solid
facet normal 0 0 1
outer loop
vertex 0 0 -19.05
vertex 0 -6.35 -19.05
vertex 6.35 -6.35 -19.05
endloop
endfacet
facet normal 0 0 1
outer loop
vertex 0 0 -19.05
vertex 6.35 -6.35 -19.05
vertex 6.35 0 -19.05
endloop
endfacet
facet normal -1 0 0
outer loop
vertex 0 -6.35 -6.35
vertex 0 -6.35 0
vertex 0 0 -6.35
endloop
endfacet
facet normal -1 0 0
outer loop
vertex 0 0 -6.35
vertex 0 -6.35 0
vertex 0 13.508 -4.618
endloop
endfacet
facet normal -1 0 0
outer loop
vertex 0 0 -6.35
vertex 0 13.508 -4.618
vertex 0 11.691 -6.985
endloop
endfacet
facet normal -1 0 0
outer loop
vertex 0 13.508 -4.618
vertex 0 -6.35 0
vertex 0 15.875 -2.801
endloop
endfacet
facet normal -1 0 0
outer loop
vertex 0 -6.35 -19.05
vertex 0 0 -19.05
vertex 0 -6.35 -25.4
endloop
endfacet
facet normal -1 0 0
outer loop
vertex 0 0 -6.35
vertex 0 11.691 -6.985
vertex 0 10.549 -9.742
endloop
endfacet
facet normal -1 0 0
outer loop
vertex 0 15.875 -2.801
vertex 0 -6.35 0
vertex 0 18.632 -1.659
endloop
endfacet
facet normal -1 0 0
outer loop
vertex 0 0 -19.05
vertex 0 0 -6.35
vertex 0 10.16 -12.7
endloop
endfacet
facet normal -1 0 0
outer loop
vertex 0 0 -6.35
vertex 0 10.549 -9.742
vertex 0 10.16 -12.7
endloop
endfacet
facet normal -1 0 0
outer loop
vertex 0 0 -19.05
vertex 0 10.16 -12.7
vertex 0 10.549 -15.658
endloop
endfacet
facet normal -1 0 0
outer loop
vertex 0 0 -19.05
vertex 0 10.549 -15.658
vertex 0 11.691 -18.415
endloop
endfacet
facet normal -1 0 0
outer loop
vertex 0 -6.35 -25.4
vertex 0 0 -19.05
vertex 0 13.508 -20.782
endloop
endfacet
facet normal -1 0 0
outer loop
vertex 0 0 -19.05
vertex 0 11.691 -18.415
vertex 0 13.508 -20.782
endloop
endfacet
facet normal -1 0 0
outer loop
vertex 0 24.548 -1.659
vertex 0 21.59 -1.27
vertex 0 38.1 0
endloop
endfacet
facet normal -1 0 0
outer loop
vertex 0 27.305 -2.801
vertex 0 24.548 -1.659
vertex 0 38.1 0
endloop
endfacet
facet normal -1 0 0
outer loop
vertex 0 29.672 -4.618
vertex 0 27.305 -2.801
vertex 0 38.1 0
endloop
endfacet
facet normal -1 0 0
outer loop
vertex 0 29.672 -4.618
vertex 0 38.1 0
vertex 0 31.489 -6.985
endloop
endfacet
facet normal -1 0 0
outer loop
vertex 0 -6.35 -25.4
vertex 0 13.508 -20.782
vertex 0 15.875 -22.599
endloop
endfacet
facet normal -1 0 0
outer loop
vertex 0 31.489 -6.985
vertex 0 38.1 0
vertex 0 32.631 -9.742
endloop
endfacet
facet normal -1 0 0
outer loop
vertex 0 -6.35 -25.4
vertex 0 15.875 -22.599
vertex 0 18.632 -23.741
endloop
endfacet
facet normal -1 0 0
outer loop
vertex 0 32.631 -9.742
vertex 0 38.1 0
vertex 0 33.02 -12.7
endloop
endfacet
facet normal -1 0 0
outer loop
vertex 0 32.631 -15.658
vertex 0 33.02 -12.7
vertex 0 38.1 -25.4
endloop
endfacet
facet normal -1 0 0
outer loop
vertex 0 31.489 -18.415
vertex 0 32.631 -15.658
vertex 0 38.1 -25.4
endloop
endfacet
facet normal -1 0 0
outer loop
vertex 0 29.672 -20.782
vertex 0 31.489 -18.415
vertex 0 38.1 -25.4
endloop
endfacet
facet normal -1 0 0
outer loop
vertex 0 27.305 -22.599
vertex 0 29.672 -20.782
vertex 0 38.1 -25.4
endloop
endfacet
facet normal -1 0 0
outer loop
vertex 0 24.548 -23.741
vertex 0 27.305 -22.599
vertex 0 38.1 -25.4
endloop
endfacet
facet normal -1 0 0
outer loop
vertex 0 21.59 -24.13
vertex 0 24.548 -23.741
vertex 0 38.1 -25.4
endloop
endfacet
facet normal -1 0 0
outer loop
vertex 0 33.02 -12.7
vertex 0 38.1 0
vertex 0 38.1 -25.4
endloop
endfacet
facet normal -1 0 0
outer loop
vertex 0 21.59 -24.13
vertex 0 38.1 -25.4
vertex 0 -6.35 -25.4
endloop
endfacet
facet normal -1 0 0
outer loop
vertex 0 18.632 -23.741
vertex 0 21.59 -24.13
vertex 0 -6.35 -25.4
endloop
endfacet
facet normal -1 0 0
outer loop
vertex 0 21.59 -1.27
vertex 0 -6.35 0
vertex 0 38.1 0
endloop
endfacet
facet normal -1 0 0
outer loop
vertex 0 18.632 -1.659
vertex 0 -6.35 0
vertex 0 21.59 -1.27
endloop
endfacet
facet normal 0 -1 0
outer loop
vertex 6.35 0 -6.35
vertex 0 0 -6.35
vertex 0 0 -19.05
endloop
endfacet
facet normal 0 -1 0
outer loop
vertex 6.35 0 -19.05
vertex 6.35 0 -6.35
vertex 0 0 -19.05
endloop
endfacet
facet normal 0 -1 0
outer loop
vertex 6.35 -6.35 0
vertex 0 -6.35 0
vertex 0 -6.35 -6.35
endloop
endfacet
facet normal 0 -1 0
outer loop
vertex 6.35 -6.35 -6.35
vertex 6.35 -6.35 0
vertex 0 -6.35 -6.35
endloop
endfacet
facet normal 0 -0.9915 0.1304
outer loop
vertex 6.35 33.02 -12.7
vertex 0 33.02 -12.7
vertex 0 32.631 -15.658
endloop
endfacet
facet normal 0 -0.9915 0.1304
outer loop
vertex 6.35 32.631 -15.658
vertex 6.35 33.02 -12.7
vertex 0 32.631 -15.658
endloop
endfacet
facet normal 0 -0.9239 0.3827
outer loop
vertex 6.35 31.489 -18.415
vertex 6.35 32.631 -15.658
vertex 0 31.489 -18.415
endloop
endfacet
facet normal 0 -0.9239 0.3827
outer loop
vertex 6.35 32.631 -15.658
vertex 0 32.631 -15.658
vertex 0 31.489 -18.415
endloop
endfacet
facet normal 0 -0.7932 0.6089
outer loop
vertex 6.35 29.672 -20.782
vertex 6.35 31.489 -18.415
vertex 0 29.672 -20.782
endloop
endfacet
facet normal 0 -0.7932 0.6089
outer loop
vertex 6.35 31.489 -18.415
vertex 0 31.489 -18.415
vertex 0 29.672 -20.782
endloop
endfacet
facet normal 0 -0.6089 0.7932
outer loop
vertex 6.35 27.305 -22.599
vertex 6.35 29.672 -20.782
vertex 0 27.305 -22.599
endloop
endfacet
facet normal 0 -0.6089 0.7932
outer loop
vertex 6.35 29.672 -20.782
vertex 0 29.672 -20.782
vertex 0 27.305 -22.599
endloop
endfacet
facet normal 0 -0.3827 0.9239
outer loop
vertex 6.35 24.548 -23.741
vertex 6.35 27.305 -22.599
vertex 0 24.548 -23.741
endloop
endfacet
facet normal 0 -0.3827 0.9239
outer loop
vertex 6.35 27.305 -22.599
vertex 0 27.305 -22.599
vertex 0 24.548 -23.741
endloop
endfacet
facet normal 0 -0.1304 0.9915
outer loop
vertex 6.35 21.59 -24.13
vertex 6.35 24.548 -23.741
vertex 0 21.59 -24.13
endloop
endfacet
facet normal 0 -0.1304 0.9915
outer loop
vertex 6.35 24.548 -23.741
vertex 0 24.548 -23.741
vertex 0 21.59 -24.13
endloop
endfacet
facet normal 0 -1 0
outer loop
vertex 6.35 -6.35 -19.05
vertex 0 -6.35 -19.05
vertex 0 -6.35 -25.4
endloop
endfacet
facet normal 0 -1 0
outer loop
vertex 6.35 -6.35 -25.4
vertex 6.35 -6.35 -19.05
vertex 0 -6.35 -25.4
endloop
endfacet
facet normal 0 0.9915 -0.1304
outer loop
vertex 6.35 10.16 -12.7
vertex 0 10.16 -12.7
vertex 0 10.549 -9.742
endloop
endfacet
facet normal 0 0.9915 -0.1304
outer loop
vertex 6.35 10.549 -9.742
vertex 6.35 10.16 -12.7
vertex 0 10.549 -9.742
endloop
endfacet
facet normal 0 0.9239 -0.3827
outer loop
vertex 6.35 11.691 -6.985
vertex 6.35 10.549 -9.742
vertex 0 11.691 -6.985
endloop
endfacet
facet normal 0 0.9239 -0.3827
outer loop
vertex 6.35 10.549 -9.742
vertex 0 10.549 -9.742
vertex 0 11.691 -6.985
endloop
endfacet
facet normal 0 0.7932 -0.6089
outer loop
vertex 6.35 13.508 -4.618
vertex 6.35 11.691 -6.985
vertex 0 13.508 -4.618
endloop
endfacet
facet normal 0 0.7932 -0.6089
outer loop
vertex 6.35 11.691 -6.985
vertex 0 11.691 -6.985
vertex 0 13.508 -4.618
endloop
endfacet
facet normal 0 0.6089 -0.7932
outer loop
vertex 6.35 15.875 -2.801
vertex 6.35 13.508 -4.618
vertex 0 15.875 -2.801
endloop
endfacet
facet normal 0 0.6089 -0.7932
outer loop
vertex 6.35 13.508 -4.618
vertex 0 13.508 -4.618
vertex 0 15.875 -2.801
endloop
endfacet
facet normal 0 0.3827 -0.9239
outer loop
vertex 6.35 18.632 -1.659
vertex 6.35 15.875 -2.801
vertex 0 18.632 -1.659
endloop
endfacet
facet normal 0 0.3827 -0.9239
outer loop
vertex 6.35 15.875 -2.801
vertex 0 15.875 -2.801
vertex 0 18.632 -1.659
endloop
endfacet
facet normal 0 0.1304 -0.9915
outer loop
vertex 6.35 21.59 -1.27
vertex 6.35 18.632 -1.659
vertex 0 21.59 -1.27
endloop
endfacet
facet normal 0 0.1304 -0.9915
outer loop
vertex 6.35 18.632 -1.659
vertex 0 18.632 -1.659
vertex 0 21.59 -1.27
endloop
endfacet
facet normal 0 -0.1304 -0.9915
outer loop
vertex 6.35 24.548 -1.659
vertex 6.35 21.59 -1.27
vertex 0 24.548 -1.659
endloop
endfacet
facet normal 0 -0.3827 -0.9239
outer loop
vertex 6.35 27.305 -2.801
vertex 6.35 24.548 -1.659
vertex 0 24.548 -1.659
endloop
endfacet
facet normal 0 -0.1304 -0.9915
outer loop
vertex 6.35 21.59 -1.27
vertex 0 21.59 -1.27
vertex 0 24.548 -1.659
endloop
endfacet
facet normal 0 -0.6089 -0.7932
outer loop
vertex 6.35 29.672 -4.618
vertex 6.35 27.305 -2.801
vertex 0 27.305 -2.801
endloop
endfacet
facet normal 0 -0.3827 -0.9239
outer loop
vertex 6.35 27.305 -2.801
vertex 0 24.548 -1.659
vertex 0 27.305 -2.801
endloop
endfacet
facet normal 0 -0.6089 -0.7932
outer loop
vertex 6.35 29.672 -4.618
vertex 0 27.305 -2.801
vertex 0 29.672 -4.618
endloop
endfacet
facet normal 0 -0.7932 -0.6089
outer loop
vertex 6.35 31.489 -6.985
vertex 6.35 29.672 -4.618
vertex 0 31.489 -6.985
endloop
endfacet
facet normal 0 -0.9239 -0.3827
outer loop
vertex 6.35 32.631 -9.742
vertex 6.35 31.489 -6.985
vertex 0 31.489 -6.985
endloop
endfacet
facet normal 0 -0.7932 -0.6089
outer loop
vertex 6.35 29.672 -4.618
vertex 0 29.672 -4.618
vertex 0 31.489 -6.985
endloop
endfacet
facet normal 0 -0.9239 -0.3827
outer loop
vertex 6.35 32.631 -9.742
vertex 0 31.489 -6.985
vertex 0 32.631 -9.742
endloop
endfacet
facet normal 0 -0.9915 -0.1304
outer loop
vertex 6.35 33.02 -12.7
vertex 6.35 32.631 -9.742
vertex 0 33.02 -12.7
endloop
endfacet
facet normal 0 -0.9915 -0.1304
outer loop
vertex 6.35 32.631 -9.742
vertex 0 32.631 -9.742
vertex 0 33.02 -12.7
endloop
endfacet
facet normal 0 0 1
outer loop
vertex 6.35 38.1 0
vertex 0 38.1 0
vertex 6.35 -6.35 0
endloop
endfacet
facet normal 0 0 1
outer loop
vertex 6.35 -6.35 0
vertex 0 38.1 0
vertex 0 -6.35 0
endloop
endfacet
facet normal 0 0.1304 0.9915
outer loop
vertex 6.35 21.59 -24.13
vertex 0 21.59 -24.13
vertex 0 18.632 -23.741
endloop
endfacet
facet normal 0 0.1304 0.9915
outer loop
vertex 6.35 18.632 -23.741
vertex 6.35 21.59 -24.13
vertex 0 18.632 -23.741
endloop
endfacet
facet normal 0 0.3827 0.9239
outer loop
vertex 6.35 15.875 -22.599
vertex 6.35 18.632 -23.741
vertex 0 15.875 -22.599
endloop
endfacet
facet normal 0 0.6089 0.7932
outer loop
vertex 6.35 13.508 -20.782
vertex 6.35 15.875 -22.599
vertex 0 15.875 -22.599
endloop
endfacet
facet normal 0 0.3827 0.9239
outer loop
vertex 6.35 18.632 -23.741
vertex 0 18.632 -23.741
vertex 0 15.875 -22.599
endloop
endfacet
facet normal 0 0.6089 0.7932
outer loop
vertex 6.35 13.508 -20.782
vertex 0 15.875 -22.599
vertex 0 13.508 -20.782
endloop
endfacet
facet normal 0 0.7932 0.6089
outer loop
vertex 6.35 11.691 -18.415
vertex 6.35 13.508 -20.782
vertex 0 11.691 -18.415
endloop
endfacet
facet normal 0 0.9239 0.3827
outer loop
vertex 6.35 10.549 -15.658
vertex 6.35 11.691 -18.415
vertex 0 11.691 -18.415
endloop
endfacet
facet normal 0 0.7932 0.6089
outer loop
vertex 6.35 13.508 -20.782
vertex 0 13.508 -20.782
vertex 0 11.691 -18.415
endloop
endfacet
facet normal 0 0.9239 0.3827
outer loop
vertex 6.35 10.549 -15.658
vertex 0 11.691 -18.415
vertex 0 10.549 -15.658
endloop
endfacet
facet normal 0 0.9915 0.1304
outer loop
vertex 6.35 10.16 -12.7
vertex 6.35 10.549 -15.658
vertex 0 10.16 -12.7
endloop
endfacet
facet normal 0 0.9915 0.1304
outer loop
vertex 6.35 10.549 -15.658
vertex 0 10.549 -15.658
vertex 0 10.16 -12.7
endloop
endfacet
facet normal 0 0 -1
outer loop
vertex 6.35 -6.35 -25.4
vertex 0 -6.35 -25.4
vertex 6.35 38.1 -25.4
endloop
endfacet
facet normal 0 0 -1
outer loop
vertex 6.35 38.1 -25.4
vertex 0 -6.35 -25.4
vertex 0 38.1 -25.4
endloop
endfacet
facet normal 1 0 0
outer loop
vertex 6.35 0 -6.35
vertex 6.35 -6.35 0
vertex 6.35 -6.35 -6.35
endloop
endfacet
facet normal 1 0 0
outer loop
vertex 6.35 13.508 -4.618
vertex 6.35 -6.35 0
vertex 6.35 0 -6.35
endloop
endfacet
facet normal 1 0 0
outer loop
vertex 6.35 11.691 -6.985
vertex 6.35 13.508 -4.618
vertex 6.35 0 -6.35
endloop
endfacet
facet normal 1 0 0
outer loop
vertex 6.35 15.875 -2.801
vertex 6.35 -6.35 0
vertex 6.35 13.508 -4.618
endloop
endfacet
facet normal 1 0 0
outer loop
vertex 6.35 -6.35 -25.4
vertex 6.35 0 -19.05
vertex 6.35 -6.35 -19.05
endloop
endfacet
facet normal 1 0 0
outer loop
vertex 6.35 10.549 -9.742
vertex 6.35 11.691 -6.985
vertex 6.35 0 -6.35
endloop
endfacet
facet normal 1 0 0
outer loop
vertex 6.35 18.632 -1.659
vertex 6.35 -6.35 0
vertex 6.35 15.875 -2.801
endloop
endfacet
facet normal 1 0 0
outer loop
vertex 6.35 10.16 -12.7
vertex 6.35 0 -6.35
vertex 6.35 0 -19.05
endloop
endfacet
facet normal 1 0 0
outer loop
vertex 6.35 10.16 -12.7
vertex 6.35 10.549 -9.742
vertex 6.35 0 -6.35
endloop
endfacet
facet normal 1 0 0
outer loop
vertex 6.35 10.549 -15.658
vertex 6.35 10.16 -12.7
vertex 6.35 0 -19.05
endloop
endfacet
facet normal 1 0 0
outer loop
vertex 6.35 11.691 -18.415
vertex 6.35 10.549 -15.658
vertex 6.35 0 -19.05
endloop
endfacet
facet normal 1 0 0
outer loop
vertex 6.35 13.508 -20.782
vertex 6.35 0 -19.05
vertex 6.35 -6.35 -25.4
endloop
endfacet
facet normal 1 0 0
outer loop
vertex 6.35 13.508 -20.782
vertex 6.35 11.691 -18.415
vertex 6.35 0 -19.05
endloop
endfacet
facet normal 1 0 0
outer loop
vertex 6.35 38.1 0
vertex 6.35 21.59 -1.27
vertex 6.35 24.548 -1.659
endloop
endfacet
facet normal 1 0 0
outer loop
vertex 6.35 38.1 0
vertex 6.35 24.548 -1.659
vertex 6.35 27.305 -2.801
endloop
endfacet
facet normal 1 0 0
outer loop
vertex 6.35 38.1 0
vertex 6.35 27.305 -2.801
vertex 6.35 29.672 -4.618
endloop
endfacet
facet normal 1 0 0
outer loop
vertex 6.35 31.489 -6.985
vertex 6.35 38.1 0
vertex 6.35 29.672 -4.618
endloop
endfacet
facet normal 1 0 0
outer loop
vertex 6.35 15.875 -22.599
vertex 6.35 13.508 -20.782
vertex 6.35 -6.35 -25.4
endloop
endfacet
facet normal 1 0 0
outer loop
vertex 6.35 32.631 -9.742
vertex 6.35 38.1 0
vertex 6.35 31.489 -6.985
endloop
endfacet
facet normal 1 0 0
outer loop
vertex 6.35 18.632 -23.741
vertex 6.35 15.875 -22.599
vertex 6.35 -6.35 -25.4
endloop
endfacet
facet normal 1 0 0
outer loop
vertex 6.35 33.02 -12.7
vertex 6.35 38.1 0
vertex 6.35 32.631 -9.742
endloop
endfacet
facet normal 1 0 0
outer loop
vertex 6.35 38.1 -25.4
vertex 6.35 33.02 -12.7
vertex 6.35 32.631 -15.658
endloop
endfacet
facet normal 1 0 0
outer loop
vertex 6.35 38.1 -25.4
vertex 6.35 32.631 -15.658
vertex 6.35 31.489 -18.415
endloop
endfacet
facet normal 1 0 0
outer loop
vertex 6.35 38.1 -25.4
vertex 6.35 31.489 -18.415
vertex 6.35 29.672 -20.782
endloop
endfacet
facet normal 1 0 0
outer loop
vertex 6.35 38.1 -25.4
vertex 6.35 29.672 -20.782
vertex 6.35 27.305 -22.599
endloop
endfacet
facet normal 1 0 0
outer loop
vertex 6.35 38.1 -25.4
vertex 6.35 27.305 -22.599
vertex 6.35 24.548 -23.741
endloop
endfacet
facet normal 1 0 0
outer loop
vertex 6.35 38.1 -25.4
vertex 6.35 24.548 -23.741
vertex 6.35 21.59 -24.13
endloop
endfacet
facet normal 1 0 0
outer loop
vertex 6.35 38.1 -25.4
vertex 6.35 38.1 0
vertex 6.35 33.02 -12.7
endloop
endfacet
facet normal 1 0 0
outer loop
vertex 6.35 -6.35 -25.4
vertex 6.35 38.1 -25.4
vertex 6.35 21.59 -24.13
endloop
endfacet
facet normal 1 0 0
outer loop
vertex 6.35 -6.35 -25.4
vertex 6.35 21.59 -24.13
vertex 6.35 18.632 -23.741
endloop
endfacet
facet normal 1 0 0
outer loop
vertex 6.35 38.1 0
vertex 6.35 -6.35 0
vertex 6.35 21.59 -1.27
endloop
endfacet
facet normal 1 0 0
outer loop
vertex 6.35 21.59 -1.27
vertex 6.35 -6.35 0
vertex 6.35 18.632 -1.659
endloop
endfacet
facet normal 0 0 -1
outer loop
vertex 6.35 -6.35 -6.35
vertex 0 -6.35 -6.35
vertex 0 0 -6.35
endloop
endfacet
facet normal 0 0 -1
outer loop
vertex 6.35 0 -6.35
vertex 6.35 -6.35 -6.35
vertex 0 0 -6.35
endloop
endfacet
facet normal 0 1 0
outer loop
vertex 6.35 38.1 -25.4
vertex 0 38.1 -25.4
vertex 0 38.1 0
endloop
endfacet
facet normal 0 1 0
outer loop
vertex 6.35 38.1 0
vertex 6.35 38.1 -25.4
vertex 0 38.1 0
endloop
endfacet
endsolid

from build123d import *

# Parameters (mm, degrees)
SKETCH1_W           = 6.35
SKETCH1_H           = 6.35
BOSS_EXTRUDE1_DEPTH = 6.35


with BuildPart() as part:
    # Sketch1 → Boss-Extrude1 (new body)
    with BuildSketch(Plane(origin=(0, 0, 0), x_dir=(0, 0, -1), z_dir=(1, 0, 0))):
        with Locations((22.225, -3.175)):
            Rectangle(SKETCH1_W, SKETCH1_H)
        with BuildLine():
            Line((25.4, 38.1), (12.7, 38.1))
            Line((12.7, 38.1), (12.7, 33.02))
            ThreePointArc((12.7, 33.02), (20.782230509, 29.672230509), (24.13, 21.59))
            ThreePointArc((24.13, 21.59), (20.782230509, 13.507769491), (12.7, 10.16))
            Line((12.7, 10.16), (12.7, 0))
            Line((12.7, 0), (19.05, 0))
            Line((19.05, 0), (25.4, 0))
            Line((25.4, 0), (25.4, 38.1))
        make_face()
        with BuildLine():
            Line((12.7, 33.02), (12.7, 38.1))
            Line((12.7, 38.1), (0, 38.1))
            Line((0, 38.1), (0, 0))
            Line((0, 0), (6.35, 0))
            Line((6.35, 0), (12.7, 0))
            Line((12.7, 0), (12.7, 10.16))
            ThreePointArc((12.7, 10.16), (1.27, 21.59), (12.7, 33.02))
        make_face()
        with Locations((3.175, -3.175)):
            Rectangle(SKETCH1_W, SKETCH1_H)
    extrude(amount=BOSS_EXTRUDE1_DEPTH)


solid = part.part
